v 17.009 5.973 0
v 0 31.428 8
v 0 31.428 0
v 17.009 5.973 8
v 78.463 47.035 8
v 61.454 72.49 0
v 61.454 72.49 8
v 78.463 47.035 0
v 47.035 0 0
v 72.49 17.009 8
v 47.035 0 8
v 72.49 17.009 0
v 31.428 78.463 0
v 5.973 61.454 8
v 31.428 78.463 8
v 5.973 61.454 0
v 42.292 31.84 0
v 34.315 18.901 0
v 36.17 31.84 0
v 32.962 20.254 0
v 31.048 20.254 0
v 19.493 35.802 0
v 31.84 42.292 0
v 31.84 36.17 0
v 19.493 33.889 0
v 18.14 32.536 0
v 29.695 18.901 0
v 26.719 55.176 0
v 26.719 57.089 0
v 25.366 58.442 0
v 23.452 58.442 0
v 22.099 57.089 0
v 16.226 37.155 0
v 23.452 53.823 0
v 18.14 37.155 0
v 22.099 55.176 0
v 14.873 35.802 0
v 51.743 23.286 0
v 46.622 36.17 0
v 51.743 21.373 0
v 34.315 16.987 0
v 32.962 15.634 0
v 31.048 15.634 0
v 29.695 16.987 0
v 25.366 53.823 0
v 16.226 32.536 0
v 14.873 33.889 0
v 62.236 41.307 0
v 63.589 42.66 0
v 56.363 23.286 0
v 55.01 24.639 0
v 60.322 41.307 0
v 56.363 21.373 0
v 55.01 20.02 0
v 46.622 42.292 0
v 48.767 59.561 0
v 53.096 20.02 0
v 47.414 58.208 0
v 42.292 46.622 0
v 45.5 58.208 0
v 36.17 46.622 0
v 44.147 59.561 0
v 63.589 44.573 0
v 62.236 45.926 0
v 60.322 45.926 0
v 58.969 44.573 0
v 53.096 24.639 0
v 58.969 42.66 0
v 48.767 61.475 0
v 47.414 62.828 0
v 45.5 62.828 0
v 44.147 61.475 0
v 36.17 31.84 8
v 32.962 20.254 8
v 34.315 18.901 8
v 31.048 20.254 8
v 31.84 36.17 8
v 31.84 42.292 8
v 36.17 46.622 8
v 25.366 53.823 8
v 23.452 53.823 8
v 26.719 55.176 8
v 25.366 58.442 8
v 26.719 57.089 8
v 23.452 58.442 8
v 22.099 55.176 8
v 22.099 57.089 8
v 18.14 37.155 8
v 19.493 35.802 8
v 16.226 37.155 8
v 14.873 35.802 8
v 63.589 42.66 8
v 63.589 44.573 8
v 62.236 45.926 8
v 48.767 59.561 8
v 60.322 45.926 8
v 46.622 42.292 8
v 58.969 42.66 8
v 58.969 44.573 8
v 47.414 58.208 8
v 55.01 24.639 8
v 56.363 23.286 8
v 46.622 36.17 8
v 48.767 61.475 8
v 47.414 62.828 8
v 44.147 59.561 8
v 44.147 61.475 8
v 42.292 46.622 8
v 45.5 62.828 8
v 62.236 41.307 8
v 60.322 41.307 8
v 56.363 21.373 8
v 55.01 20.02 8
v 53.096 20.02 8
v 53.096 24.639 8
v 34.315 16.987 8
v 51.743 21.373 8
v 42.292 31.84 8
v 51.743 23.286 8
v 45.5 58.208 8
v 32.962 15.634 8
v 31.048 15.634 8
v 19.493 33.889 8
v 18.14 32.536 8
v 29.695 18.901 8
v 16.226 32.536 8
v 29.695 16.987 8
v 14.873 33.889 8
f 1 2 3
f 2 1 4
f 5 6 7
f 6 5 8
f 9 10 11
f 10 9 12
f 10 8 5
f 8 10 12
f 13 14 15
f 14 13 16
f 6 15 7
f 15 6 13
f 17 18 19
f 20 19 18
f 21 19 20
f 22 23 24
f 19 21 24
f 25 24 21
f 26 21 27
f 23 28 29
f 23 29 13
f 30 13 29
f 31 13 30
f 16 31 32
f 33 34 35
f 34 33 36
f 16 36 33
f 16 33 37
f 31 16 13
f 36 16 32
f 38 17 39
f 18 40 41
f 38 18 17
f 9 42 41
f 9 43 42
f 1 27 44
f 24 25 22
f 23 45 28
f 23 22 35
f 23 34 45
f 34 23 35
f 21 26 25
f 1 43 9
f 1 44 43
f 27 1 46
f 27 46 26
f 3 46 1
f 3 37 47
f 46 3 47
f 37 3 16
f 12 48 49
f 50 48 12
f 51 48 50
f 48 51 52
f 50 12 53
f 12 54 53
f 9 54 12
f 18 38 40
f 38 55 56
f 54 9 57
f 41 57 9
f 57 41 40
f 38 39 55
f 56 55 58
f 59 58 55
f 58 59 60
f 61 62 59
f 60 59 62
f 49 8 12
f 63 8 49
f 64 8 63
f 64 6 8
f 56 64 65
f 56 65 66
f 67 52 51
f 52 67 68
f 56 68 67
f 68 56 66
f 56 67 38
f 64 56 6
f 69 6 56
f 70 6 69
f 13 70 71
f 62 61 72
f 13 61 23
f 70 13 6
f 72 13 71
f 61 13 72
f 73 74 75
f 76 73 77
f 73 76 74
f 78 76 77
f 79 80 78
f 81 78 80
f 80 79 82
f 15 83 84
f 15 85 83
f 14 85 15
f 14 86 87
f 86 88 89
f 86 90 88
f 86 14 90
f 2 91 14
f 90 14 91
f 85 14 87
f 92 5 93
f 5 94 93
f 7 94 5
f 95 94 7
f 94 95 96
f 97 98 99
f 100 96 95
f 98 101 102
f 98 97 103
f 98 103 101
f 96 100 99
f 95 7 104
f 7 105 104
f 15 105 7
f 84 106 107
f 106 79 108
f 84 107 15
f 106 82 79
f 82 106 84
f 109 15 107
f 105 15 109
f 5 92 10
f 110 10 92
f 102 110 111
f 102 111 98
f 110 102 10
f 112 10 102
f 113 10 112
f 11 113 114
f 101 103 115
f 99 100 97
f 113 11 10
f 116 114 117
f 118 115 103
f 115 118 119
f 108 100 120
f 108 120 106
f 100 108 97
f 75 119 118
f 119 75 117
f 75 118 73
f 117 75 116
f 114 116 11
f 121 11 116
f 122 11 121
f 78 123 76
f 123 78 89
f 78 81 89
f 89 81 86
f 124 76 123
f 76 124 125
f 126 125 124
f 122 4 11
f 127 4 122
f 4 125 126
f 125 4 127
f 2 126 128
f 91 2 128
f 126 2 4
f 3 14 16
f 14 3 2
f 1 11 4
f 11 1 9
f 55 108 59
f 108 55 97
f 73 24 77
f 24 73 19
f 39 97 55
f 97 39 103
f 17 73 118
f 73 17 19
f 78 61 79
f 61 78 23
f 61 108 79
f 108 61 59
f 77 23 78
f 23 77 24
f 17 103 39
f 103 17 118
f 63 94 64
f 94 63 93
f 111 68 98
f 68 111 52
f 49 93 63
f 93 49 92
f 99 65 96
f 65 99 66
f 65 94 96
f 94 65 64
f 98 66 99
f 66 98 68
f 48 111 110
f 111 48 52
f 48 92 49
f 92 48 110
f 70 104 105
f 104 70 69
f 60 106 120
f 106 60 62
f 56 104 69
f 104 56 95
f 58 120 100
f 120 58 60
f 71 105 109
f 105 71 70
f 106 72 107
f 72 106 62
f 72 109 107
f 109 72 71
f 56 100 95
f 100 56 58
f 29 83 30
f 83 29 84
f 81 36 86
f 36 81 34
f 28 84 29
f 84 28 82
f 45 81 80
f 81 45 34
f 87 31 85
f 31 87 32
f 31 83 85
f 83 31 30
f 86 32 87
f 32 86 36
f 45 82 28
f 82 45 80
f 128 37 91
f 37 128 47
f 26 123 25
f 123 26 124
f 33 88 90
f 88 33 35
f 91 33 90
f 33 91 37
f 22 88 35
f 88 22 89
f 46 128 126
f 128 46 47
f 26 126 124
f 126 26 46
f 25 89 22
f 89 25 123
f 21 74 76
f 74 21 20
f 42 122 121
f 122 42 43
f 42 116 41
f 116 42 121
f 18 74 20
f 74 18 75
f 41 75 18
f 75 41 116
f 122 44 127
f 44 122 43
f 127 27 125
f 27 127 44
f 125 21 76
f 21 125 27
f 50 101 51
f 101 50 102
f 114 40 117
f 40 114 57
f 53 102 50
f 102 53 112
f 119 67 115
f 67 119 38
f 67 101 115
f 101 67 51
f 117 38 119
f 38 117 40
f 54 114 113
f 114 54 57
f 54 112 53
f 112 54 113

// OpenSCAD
$fn = 32;

// ----------------------------------------------------------------------
// Polygon plate: 8-gon R40, 6 bolt windows
// ----------------------------------------------------------------------

// --- parameters (mm) ---
sides = 8;                // number of polygon sides
plate_r = 40;             // circumscribed radius of the polygon
bore_r = 8;               // centre bore radius
bolts = 6;                // number of bolt windows
ring_r = 22.48;           // bolt-circle radius
bolt_r = 2.5;             // bolt window radius
plate_t = 8;              // plate thickness, Z (extrusion height)

plate_d = 2 * plate_r;  // circumscribed diameter
bore_d = 2 * bore_r;  // centre bore diameter
bolt_d = 2 * bolt_r;  // bolt window diameter
ring_d = 2 * ring_r;  // bolt-circle diameter

profile = [[78.463, 47.035], [61.454, 72.49], [31.428, 78.463], [5.973, 61.454], [0, 31.428], [17.009, 5.973], [47.035, 0], [72.49, 17.009]];  // primary outline, 8 points, counter clockwise
void_1 = [[46.622, 42.292], [42.292, 46.622], [36.17, 46.622], [31.84, 42.292], [31.84, 36.17], [36.17, 31.84], [42.292, 31.84], [46.622, 36.17]];  // centre bore, 8 points
void_2 = [[63.589, 44.573], [62.236, 45.926], [60.322, 45.926], [58.969, 44.573], [58.969, 42.66], [60.322, 41.307], [62.236, 41.307], [63.589, 42.66]];  // bolt window 1, 8 points
void_3 = [[48.767, 61.475], [47.414, 62.828], [45.5, 62.828], [44.147, 61.475], [44.147, 59.561], [45.5, 58.208], [47.414, 58.208], [48.767, 59.561]];  // bolt window 2, 8 points
void_4 = [[26.719, 57.089], [25.366, 58.442], [23.452, 58.442], [22.099, 57.089], [22.099, 55.176], [23.452, 53.823], [25.366, 53.823], [26.719, 55.176]];  // bolt window 3, 8 points
void_5 = [[19.493, 35.802], [18.14, 37.155], [16.226, 37.155], [14.873, 35.802], [14.873, 33.889], [16.226, 32.536], [18.14, 32.536], [19.493, 33.889]];  // bolt window 4, 8 points
void_6 = [[34.315, 18.901], [32.962, 20.254], [31.048, 20.254], [29.695, 18.901], [29.695, 16.987], [31.048, 15.634], [32.962, 15.634], [34.315, 16.987]];  // bolt window 5, 8 points
void_7 = [[56.363, 23.286], [55.01, 24.639], [53.096, 24.639], [51.743, 23.286], [51.743, 21.373], [53.096, 20.02], [55.01, 20.02], [56.363, 21.373]];  // bolt window 6, 8 points

// --- the one profile operation ---
difference() {
  linear_extrude(height = plate_t) polygon(points = profile);
  translate([0, 0, -1])
    linear_extrude(height = plate_t + 2) polygon(points = void_1);
  translate([0, 0, -1])
    linear_extrude(height = plate_t + 2) polygon(points = void_2);
  translate([0, 0, -1])
    linear_extrude(height = plate_t + 2) polygon(points = void_3);
  translate([0, 0, -1])
    linear_extrude(height = plate_t + 2) polygon(points = void_4);
  translate([0, 0, -1])
    linear_extrude(height = plate_t + 2) polygon(points = void_5);
  translate([0, 0, -1])
    linear_extrude(height = plate_t + 2) polygon(points = void_6);
  translate([0, 0, -1])
    linear_extrude(height = plate_t + 2) polygon(points = void_7);
}
